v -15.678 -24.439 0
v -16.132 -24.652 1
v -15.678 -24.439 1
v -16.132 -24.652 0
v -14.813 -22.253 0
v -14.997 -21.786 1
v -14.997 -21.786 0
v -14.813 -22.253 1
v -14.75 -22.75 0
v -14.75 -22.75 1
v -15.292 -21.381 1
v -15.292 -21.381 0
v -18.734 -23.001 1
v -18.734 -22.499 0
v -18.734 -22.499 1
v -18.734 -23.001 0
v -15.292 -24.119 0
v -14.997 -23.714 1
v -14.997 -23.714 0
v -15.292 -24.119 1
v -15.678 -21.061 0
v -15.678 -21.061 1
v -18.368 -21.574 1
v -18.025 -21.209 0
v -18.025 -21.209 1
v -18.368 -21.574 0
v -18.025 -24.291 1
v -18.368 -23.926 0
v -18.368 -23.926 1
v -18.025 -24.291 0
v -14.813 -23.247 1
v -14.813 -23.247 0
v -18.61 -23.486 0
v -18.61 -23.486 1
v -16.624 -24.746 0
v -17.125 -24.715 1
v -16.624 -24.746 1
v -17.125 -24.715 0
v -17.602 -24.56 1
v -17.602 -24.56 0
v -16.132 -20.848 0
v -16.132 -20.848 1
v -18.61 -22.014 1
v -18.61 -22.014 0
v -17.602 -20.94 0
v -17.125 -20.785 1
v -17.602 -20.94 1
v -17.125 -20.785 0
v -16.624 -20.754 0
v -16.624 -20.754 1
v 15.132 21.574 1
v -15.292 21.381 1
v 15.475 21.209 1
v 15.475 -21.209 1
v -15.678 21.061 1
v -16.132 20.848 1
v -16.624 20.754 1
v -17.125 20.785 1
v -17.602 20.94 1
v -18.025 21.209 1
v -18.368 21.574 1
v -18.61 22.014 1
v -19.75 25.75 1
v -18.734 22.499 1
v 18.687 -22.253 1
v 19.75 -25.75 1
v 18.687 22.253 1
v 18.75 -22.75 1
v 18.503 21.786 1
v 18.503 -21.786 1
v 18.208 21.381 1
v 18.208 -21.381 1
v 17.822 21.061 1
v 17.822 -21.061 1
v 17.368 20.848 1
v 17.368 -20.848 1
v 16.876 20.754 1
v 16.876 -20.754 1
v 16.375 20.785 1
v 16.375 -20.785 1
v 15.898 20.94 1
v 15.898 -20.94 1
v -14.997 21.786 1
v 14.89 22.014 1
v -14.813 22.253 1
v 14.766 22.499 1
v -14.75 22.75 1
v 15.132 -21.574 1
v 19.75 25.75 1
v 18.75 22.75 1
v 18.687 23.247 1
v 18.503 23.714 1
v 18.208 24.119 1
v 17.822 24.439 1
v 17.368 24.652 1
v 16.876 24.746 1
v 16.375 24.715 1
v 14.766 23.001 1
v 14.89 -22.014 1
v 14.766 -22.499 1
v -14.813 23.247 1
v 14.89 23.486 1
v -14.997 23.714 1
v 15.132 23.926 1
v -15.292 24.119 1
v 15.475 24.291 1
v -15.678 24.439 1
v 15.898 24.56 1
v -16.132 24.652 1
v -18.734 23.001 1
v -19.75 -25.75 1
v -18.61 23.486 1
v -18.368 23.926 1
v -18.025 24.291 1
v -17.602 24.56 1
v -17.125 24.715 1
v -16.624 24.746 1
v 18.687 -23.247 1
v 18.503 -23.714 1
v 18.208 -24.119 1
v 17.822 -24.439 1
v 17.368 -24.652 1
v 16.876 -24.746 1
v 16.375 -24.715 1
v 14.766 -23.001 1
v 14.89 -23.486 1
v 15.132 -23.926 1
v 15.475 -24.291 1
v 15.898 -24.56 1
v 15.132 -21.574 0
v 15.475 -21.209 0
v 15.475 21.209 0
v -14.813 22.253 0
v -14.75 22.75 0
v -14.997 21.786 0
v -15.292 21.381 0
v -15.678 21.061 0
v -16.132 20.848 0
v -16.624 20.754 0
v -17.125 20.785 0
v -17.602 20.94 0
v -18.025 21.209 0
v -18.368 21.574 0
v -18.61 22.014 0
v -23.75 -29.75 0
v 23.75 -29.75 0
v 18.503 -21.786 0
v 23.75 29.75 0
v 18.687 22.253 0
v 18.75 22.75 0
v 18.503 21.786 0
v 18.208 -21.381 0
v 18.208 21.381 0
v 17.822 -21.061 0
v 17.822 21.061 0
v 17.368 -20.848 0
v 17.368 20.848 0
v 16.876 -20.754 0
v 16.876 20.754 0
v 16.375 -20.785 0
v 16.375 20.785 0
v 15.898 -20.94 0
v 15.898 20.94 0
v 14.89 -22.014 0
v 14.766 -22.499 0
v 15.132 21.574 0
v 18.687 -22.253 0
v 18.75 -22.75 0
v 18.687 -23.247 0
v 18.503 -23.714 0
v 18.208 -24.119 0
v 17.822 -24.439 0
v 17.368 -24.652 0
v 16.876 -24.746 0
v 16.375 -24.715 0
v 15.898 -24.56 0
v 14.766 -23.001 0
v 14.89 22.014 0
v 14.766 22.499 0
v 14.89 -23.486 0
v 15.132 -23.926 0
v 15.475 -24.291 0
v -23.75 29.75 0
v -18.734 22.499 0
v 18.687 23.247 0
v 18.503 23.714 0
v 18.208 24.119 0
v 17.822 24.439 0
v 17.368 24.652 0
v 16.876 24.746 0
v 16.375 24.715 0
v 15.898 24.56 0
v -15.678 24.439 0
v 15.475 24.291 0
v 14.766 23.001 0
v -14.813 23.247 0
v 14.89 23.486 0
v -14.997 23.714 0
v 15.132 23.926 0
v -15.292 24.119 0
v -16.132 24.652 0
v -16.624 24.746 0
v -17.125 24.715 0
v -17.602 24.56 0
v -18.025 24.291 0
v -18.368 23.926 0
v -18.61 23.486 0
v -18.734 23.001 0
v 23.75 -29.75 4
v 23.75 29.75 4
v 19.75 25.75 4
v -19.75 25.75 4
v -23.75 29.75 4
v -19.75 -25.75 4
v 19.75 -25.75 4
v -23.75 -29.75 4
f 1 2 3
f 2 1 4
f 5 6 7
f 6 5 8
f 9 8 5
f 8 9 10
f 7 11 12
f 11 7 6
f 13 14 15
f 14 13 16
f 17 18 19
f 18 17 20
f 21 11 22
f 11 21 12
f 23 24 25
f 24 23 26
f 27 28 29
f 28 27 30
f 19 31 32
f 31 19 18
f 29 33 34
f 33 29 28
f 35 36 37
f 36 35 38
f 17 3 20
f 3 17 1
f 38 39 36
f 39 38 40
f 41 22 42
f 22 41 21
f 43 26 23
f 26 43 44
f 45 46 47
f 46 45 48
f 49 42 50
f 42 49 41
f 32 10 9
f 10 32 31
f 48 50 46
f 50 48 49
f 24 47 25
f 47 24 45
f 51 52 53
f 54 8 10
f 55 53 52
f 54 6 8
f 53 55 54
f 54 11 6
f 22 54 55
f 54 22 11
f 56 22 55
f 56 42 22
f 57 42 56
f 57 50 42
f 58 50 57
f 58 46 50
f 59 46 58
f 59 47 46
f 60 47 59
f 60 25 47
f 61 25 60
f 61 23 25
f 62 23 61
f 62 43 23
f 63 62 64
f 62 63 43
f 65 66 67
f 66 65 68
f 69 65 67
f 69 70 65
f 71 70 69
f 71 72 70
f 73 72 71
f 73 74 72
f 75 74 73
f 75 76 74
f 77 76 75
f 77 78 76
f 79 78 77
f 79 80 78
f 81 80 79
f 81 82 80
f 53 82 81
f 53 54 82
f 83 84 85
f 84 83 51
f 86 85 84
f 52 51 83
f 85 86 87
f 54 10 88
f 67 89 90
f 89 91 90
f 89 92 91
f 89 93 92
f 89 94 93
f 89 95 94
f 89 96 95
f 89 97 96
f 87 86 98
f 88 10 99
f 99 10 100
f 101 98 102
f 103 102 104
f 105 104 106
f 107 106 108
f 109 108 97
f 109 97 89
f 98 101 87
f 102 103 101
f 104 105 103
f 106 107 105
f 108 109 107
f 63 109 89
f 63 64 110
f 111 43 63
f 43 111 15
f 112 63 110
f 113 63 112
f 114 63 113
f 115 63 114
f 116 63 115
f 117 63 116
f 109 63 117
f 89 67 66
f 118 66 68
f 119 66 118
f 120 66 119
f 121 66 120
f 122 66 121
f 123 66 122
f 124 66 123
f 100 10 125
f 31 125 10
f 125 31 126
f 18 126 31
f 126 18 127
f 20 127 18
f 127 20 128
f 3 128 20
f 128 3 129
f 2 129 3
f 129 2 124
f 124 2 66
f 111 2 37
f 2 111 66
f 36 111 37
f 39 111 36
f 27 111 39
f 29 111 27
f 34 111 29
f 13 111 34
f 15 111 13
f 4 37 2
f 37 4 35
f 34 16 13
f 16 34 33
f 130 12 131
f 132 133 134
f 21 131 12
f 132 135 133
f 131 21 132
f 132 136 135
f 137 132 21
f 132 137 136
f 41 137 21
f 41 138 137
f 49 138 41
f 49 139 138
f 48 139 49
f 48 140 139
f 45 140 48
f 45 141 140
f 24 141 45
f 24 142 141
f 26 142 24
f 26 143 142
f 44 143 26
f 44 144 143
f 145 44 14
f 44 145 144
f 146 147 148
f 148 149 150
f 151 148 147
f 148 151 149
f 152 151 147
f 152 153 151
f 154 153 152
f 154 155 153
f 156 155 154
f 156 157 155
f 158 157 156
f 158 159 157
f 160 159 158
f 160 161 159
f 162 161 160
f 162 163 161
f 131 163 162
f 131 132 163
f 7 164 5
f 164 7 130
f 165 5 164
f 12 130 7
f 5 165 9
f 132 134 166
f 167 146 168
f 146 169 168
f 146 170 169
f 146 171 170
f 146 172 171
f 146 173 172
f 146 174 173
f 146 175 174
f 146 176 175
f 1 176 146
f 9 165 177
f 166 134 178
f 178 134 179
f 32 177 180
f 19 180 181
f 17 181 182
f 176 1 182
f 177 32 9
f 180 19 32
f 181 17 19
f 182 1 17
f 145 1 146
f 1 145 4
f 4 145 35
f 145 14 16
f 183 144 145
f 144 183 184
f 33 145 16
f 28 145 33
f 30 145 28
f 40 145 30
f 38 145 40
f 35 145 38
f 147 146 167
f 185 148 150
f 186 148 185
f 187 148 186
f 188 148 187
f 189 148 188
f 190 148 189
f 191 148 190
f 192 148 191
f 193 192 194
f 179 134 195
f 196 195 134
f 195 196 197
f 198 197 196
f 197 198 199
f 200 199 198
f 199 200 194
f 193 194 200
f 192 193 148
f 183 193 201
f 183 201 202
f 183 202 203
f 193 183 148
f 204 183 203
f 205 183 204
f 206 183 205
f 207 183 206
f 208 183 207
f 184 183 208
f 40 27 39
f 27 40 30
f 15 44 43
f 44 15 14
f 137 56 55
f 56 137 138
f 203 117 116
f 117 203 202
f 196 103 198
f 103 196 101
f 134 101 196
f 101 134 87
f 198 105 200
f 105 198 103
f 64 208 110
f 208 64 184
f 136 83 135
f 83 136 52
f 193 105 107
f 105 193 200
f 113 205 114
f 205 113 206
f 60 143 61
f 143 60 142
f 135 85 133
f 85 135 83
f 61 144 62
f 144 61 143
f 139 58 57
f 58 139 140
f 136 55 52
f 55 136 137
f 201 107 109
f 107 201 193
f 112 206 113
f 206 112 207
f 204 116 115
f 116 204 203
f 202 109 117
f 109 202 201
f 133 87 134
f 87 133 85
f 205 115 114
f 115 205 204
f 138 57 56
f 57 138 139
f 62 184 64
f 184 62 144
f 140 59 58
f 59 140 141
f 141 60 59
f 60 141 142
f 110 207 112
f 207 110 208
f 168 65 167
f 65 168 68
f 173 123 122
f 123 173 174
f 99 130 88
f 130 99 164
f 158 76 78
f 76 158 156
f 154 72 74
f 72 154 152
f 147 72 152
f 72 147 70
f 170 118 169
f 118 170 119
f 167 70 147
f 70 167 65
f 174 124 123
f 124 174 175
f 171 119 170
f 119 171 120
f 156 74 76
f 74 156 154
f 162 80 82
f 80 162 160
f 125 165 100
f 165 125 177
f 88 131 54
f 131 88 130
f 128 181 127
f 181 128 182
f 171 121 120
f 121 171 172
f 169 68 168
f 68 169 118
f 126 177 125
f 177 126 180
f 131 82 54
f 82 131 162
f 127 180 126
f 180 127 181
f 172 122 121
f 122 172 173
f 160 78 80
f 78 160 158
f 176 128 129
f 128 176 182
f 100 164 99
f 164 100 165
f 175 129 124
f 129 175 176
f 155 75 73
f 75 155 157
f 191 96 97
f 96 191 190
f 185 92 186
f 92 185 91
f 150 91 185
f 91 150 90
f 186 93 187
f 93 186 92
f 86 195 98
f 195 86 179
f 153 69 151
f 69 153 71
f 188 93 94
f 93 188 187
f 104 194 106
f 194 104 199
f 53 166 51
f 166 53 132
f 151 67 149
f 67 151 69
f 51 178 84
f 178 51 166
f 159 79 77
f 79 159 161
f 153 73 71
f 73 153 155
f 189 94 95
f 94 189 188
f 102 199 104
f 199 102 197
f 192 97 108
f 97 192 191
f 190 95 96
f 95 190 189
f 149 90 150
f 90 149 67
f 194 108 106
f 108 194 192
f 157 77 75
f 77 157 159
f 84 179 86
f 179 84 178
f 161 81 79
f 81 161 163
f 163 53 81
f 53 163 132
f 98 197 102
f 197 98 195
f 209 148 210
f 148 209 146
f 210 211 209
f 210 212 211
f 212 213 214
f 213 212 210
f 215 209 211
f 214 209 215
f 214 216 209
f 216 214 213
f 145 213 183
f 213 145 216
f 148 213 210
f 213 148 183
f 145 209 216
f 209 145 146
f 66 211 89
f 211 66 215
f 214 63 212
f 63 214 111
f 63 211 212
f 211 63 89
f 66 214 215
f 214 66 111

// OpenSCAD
boardWidth = 39.5;
boardLength = 51.5;

baseThickness = 1.0;

bezelWidth = 4.0;
bezelHeight = 3.0;

holeSeparationX = 33.5;
holeSeparationY = 45.5;
holeRadius = 4.0 / 2;


cradleWidth = boardWidth + 2 * bezelWidth;
cradleLength = boardLength + 2 * bezelWidth;


difference() {
  // Main body
  translate([-cradleWidth / 2, -cradleLength / 2, 0]) {
    cube([cradleWidth, cradleLength, baseThickness + bezelHeight]);
  }
  
  // Board cutout
  translate([-boardWidth / 2, -boardLength / 2, baseThickness]) {
    cube([boardWidth, boardLength, bezelHeight]);
  }
  
  // Holes
  for (x = [-0.5, 0.5]) {
    for (y = [-0.5, 0.5]) {
      translate([x * holeSeparationX, y * holeSeparationY, 0]) {
        cylinder(baseThickness, holeRadius, holeRadius, $fn = 25);
      }
    }
  }
}
